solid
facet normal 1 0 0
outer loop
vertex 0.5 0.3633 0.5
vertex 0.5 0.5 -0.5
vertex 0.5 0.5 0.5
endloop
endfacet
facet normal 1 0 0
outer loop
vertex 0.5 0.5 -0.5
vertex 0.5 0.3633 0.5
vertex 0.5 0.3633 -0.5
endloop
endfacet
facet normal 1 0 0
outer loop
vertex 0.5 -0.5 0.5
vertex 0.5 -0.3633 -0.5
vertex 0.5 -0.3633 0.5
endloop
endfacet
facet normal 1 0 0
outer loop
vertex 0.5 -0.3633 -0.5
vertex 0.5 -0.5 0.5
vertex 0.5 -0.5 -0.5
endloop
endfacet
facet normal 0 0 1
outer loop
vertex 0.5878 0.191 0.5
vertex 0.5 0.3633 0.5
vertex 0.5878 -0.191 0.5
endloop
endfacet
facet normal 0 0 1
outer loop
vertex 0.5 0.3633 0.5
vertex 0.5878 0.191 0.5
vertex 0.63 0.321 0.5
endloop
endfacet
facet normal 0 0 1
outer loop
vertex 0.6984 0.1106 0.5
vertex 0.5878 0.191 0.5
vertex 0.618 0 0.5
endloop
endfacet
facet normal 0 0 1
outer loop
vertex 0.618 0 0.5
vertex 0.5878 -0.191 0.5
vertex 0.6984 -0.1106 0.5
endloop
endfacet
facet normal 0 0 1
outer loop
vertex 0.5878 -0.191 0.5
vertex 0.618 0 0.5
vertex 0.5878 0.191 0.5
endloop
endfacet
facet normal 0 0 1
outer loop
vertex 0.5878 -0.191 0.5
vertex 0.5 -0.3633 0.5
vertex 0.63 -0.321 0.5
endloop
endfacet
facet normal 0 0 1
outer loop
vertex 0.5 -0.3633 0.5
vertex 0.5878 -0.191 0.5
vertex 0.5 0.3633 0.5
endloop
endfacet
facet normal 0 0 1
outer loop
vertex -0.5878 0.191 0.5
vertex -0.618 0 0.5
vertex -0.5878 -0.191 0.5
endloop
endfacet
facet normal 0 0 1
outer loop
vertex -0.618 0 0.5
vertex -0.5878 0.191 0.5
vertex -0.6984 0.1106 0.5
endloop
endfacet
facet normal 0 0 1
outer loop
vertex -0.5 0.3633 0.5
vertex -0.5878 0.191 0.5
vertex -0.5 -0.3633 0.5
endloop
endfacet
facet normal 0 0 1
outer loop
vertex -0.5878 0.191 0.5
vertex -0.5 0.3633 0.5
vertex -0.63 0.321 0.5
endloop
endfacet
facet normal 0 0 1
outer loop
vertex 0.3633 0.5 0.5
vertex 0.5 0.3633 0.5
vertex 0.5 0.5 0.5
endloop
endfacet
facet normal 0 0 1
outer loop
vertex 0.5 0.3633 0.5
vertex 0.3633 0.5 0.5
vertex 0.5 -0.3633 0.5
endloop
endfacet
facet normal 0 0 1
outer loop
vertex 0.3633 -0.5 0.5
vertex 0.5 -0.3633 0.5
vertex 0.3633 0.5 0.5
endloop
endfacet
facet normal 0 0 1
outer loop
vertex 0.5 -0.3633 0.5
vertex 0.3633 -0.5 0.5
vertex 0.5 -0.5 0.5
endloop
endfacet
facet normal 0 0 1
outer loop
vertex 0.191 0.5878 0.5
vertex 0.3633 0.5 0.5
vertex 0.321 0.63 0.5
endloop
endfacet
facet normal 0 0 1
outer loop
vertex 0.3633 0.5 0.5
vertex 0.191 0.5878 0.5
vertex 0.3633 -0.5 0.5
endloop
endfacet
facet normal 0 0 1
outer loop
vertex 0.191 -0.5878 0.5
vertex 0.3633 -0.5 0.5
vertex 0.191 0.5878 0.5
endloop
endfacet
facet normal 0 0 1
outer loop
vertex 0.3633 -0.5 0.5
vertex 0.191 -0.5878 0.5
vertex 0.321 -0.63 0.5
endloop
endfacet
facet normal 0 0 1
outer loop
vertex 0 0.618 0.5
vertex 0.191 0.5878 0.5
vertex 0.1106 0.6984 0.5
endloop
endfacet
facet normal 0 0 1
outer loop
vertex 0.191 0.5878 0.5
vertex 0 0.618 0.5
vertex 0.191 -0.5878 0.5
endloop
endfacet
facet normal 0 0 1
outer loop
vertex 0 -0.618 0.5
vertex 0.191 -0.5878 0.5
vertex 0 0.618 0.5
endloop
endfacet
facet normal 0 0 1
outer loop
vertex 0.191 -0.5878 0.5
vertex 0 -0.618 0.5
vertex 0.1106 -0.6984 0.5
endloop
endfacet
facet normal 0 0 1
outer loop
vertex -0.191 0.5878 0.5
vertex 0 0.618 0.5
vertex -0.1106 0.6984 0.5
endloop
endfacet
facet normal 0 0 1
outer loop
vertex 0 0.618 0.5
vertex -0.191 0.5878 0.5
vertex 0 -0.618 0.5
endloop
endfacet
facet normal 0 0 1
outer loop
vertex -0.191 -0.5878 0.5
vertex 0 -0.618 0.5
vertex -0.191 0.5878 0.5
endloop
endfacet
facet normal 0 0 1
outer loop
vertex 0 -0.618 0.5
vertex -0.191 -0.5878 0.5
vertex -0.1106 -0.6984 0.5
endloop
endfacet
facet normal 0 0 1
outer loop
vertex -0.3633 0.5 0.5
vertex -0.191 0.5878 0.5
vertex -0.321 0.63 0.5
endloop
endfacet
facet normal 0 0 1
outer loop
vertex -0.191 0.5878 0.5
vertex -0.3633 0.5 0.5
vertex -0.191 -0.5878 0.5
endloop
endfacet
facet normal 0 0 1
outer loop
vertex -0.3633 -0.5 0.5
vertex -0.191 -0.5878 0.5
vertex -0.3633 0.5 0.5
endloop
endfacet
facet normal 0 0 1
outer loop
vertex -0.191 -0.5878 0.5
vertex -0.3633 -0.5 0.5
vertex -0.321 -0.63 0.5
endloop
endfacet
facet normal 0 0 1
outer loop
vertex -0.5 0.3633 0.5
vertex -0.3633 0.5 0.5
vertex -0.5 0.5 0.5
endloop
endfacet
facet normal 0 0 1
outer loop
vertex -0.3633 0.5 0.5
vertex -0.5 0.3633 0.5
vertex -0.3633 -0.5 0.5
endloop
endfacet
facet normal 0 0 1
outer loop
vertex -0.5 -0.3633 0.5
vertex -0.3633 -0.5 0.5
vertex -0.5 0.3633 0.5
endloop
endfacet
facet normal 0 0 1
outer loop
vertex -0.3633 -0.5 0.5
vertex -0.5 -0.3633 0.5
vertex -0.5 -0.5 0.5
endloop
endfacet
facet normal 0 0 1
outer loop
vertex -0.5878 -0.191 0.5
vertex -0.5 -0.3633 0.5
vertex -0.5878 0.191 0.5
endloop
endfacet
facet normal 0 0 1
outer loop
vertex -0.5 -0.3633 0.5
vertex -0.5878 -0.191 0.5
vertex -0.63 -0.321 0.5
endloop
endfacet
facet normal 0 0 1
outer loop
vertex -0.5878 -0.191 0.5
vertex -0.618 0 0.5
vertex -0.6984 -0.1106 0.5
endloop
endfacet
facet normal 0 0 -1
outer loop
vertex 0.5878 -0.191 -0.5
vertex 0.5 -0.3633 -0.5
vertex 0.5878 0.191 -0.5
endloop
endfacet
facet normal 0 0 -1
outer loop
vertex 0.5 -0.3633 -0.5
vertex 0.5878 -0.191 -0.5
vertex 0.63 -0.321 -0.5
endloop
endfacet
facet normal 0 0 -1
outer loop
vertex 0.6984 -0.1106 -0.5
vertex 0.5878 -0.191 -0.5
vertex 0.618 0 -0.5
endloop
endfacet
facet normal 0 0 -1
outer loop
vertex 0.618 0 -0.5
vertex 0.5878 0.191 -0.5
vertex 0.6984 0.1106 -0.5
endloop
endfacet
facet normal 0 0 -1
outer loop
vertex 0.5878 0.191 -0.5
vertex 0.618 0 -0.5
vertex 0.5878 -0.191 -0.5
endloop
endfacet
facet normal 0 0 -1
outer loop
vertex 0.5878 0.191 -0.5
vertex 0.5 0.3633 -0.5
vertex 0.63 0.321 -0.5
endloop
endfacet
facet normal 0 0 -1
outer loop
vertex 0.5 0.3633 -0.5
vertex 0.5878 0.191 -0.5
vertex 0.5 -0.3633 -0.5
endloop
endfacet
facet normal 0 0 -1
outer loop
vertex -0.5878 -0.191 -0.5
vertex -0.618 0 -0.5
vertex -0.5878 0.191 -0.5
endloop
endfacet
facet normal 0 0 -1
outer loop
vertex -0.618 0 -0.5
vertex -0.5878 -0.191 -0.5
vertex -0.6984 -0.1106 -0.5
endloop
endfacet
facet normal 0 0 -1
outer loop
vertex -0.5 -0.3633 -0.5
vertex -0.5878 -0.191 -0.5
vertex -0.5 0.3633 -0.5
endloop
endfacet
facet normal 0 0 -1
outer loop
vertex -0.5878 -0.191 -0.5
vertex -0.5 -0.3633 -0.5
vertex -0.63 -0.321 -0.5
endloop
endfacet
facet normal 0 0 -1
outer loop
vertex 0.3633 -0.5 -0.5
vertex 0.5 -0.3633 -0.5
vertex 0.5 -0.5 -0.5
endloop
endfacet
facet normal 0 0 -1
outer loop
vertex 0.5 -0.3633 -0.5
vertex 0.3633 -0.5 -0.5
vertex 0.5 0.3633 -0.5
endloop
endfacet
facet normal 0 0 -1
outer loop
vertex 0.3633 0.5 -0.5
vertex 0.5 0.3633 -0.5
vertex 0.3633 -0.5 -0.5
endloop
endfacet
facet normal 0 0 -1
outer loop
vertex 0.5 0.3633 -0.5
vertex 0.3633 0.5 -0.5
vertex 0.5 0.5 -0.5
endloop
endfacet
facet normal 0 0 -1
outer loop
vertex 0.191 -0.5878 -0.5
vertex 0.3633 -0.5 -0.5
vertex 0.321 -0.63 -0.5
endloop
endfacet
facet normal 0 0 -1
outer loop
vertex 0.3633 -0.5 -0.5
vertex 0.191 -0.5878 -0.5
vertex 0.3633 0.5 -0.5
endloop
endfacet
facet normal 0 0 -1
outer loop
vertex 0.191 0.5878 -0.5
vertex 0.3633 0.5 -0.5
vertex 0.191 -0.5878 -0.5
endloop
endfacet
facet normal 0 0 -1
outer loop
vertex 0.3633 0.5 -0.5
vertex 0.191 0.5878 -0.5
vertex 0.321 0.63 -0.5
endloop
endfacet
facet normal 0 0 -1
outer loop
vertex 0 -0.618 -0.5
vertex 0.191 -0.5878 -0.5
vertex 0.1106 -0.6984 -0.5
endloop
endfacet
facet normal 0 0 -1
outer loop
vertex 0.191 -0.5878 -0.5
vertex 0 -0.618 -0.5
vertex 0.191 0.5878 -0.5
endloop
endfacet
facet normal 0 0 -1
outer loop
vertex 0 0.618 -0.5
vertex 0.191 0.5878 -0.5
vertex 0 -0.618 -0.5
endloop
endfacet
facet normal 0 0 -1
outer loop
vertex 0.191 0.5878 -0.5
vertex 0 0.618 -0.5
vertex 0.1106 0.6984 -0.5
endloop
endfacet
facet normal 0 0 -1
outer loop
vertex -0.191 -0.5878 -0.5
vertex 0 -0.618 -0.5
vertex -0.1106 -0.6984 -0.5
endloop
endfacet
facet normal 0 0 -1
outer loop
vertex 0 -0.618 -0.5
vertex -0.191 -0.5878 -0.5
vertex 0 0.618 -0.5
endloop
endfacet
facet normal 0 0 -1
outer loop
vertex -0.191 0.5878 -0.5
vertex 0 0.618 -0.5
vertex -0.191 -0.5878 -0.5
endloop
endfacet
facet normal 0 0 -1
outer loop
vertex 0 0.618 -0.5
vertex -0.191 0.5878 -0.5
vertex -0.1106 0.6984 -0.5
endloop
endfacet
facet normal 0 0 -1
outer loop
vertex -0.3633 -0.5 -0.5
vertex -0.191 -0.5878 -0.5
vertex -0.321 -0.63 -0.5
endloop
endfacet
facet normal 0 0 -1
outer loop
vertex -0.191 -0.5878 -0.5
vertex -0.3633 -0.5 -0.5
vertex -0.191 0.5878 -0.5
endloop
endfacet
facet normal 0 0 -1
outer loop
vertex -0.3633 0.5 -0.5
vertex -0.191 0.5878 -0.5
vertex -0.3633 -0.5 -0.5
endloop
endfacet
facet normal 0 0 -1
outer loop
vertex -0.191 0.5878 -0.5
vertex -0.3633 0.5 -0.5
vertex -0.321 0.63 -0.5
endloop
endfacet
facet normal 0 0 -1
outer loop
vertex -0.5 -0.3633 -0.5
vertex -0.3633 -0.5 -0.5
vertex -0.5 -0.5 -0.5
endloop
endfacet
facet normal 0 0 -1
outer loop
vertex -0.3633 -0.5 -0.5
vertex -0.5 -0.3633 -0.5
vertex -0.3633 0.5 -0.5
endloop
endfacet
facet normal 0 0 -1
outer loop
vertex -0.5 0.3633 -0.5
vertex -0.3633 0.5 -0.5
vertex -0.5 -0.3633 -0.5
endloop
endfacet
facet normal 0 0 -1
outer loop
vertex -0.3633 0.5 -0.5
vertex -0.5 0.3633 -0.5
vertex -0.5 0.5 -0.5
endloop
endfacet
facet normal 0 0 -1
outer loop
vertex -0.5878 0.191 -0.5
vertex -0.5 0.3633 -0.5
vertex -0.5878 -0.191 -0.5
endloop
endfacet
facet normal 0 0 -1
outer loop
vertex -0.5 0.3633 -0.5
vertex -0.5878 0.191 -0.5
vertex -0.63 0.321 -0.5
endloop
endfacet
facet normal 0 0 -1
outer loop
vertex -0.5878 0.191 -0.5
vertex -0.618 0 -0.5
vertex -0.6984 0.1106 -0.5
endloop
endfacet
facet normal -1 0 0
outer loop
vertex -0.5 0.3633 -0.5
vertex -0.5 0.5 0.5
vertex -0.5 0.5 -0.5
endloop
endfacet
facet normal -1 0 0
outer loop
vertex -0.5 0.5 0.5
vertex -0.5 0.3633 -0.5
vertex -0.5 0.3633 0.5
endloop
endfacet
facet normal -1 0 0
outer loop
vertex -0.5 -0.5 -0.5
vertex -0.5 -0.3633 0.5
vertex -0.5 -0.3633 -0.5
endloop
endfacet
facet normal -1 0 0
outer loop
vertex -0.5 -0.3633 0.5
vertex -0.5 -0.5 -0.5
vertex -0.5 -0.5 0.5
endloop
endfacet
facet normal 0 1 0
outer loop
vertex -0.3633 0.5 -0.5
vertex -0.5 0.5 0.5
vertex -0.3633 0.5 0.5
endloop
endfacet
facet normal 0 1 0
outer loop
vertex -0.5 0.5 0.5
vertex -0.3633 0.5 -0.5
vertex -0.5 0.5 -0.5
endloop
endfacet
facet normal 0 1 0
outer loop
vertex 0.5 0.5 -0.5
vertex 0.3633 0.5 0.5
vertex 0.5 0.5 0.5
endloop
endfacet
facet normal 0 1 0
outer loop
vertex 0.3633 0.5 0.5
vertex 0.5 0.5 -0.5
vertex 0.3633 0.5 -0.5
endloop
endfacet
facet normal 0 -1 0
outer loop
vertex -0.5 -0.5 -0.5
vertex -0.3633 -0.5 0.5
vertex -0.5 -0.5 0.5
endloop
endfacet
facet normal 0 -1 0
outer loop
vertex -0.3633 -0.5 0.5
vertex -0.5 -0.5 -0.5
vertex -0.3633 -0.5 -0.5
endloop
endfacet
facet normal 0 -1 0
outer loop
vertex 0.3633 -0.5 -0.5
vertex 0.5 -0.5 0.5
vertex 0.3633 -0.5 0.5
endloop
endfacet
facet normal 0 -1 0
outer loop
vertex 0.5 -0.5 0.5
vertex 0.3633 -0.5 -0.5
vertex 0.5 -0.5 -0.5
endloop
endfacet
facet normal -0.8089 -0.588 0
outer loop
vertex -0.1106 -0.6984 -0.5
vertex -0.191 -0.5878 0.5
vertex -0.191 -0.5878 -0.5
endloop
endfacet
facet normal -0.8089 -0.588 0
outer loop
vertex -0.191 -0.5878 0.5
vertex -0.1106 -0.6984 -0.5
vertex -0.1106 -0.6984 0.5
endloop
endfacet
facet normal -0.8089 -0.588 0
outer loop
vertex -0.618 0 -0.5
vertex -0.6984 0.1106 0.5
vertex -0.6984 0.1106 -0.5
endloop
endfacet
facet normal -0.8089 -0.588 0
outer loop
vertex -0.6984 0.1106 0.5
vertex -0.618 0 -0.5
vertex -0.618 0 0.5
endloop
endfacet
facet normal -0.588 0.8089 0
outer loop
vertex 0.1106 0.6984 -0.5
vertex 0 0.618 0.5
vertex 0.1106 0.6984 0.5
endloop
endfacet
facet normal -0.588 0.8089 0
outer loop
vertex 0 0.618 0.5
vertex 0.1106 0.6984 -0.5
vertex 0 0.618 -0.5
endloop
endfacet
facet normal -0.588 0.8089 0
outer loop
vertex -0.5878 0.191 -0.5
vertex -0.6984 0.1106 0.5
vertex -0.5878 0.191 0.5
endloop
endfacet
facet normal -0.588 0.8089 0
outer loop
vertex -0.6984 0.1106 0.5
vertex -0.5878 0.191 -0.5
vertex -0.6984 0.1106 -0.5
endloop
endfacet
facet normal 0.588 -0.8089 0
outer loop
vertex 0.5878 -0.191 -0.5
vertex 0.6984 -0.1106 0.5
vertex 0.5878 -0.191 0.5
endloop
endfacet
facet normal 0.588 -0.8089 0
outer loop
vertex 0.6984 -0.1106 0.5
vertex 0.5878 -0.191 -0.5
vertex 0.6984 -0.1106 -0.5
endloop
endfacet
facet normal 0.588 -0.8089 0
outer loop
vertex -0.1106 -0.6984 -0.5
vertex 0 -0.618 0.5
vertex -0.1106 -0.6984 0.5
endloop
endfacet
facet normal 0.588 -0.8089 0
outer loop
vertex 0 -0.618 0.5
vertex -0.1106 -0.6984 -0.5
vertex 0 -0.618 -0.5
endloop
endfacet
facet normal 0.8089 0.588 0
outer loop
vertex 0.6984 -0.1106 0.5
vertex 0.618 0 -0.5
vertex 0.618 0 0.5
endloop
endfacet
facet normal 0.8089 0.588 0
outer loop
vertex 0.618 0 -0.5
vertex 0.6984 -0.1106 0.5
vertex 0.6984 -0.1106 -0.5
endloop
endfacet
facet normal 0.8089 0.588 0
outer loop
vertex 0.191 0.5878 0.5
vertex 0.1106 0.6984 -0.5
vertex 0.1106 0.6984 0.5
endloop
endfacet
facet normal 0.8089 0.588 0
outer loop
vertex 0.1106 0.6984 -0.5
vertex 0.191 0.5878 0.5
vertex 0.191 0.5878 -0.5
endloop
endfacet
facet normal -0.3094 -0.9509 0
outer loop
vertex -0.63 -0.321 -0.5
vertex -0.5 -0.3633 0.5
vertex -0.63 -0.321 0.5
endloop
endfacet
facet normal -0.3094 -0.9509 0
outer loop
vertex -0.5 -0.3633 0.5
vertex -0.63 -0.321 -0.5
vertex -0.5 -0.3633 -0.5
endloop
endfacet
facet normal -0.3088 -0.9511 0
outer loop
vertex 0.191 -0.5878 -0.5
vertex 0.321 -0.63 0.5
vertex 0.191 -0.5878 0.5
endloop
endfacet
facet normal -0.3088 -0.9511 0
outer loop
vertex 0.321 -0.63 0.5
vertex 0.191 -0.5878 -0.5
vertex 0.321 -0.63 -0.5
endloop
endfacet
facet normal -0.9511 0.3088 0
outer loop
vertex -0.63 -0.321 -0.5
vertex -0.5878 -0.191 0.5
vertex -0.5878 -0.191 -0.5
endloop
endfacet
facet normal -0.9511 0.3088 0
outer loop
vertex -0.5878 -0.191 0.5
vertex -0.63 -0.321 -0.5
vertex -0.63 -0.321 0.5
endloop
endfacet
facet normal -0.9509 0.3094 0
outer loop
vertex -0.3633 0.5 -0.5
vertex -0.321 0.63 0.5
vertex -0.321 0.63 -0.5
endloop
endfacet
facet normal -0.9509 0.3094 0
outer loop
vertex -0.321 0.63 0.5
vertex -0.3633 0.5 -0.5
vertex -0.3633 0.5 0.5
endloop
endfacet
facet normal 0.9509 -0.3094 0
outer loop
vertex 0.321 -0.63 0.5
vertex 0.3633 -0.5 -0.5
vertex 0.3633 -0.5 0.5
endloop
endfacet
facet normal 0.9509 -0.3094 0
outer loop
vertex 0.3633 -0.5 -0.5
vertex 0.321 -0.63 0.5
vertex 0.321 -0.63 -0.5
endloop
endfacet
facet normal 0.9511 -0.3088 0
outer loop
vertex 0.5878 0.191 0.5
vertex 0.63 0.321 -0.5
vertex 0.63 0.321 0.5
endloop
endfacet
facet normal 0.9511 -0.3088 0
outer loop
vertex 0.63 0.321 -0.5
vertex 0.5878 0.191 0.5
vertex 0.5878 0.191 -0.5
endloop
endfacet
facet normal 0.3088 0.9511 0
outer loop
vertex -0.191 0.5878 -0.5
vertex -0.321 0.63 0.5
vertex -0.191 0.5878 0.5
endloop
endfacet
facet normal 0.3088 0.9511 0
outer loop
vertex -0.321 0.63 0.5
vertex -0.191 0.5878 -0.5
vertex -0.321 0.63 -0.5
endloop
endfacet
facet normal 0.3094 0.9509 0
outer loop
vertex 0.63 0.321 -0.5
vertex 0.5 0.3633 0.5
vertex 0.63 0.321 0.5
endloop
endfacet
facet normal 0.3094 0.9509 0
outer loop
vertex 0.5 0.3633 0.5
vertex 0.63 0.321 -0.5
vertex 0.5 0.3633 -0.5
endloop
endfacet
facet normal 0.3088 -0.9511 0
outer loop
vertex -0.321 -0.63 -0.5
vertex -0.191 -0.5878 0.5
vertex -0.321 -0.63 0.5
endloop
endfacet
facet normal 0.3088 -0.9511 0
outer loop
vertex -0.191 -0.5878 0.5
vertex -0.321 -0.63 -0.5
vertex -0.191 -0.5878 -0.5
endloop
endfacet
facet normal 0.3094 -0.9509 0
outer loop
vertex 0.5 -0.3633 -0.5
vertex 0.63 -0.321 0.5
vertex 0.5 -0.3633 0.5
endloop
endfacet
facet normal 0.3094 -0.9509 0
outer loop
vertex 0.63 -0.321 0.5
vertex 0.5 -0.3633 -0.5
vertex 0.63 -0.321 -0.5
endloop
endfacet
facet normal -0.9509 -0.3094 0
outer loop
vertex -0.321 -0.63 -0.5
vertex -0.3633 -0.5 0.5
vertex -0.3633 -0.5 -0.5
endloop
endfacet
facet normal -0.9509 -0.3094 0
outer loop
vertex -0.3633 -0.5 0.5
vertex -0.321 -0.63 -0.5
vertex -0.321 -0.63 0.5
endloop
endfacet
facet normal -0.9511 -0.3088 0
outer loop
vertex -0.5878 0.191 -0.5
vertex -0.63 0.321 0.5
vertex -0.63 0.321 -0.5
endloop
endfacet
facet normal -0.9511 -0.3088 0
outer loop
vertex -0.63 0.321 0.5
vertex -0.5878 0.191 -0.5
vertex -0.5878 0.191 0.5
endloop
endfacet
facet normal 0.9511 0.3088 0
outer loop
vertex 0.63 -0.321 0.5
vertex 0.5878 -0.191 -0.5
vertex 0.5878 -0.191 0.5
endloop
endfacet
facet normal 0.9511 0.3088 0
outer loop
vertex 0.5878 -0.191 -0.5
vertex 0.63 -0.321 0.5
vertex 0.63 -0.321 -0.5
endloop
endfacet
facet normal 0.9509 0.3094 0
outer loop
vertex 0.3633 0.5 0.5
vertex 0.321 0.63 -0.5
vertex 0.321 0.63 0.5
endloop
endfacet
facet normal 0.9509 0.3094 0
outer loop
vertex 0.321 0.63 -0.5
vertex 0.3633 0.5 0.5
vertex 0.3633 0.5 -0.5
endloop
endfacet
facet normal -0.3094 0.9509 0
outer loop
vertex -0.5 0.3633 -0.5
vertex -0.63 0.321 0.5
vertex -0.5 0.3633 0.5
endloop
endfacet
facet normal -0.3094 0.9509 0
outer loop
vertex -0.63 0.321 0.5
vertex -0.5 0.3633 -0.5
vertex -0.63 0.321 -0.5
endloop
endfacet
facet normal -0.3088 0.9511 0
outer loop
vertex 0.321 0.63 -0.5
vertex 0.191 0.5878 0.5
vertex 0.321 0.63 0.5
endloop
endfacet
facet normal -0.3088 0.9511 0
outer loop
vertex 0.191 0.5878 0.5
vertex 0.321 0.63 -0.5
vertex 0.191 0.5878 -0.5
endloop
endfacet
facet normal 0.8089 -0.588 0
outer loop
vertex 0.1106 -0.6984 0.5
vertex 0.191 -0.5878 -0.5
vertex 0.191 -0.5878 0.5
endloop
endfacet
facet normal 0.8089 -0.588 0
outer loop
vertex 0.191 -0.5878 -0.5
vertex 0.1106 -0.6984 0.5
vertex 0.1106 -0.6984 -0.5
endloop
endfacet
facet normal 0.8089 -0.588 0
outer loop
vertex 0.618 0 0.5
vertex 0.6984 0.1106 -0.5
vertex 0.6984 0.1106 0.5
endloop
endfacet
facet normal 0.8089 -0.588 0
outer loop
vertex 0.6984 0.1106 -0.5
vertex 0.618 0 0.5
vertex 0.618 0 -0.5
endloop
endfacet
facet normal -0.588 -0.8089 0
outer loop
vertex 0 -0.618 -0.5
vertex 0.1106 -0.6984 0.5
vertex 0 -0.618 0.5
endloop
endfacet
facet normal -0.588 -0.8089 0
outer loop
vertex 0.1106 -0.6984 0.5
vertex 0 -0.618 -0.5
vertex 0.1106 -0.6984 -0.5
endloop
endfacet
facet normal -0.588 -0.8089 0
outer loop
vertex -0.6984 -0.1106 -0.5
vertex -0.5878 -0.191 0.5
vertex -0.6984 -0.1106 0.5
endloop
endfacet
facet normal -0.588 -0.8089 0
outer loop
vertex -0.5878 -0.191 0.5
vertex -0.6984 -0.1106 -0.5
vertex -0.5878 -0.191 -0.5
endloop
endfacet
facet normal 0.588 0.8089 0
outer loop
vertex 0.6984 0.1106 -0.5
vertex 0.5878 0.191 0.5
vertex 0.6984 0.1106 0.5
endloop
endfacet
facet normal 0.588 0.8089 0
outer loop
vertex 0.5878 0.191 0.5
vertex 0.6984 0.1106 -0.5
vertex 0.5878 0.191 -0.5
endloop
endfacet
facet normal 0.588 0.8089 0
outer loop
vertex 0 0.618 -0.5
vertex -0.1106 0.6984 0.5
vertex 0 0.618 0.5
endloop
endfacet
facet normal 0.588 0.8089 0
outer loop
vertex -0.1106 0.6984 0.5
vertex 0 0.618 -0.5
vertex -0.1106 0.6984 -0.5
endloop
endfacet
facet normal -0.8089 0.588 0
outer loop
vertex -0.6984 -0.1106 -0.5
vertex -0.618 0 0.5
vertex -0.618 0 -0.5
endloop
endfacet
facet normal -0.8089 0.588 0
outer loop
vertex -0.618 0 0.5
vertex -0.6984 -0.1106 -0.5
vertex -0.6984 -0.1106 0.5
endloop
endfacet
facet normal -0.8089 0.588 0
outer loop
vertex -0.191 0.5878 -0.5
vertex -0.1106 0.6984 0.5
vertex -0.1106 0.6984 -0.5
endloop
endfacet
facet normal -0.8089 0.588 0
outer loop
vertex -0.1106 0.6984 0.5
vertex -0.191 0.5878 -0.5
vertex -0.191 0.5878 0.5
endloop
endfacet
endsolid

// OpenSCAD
module multi_rot_cube(N=10) {
   alpha=360/N;
   union() {
      for(i=[0:N-1]) {
         rotate(i*alpha)
            cube(center=true);
      }
   }
}


multi_rot_cube(N=10);

   
